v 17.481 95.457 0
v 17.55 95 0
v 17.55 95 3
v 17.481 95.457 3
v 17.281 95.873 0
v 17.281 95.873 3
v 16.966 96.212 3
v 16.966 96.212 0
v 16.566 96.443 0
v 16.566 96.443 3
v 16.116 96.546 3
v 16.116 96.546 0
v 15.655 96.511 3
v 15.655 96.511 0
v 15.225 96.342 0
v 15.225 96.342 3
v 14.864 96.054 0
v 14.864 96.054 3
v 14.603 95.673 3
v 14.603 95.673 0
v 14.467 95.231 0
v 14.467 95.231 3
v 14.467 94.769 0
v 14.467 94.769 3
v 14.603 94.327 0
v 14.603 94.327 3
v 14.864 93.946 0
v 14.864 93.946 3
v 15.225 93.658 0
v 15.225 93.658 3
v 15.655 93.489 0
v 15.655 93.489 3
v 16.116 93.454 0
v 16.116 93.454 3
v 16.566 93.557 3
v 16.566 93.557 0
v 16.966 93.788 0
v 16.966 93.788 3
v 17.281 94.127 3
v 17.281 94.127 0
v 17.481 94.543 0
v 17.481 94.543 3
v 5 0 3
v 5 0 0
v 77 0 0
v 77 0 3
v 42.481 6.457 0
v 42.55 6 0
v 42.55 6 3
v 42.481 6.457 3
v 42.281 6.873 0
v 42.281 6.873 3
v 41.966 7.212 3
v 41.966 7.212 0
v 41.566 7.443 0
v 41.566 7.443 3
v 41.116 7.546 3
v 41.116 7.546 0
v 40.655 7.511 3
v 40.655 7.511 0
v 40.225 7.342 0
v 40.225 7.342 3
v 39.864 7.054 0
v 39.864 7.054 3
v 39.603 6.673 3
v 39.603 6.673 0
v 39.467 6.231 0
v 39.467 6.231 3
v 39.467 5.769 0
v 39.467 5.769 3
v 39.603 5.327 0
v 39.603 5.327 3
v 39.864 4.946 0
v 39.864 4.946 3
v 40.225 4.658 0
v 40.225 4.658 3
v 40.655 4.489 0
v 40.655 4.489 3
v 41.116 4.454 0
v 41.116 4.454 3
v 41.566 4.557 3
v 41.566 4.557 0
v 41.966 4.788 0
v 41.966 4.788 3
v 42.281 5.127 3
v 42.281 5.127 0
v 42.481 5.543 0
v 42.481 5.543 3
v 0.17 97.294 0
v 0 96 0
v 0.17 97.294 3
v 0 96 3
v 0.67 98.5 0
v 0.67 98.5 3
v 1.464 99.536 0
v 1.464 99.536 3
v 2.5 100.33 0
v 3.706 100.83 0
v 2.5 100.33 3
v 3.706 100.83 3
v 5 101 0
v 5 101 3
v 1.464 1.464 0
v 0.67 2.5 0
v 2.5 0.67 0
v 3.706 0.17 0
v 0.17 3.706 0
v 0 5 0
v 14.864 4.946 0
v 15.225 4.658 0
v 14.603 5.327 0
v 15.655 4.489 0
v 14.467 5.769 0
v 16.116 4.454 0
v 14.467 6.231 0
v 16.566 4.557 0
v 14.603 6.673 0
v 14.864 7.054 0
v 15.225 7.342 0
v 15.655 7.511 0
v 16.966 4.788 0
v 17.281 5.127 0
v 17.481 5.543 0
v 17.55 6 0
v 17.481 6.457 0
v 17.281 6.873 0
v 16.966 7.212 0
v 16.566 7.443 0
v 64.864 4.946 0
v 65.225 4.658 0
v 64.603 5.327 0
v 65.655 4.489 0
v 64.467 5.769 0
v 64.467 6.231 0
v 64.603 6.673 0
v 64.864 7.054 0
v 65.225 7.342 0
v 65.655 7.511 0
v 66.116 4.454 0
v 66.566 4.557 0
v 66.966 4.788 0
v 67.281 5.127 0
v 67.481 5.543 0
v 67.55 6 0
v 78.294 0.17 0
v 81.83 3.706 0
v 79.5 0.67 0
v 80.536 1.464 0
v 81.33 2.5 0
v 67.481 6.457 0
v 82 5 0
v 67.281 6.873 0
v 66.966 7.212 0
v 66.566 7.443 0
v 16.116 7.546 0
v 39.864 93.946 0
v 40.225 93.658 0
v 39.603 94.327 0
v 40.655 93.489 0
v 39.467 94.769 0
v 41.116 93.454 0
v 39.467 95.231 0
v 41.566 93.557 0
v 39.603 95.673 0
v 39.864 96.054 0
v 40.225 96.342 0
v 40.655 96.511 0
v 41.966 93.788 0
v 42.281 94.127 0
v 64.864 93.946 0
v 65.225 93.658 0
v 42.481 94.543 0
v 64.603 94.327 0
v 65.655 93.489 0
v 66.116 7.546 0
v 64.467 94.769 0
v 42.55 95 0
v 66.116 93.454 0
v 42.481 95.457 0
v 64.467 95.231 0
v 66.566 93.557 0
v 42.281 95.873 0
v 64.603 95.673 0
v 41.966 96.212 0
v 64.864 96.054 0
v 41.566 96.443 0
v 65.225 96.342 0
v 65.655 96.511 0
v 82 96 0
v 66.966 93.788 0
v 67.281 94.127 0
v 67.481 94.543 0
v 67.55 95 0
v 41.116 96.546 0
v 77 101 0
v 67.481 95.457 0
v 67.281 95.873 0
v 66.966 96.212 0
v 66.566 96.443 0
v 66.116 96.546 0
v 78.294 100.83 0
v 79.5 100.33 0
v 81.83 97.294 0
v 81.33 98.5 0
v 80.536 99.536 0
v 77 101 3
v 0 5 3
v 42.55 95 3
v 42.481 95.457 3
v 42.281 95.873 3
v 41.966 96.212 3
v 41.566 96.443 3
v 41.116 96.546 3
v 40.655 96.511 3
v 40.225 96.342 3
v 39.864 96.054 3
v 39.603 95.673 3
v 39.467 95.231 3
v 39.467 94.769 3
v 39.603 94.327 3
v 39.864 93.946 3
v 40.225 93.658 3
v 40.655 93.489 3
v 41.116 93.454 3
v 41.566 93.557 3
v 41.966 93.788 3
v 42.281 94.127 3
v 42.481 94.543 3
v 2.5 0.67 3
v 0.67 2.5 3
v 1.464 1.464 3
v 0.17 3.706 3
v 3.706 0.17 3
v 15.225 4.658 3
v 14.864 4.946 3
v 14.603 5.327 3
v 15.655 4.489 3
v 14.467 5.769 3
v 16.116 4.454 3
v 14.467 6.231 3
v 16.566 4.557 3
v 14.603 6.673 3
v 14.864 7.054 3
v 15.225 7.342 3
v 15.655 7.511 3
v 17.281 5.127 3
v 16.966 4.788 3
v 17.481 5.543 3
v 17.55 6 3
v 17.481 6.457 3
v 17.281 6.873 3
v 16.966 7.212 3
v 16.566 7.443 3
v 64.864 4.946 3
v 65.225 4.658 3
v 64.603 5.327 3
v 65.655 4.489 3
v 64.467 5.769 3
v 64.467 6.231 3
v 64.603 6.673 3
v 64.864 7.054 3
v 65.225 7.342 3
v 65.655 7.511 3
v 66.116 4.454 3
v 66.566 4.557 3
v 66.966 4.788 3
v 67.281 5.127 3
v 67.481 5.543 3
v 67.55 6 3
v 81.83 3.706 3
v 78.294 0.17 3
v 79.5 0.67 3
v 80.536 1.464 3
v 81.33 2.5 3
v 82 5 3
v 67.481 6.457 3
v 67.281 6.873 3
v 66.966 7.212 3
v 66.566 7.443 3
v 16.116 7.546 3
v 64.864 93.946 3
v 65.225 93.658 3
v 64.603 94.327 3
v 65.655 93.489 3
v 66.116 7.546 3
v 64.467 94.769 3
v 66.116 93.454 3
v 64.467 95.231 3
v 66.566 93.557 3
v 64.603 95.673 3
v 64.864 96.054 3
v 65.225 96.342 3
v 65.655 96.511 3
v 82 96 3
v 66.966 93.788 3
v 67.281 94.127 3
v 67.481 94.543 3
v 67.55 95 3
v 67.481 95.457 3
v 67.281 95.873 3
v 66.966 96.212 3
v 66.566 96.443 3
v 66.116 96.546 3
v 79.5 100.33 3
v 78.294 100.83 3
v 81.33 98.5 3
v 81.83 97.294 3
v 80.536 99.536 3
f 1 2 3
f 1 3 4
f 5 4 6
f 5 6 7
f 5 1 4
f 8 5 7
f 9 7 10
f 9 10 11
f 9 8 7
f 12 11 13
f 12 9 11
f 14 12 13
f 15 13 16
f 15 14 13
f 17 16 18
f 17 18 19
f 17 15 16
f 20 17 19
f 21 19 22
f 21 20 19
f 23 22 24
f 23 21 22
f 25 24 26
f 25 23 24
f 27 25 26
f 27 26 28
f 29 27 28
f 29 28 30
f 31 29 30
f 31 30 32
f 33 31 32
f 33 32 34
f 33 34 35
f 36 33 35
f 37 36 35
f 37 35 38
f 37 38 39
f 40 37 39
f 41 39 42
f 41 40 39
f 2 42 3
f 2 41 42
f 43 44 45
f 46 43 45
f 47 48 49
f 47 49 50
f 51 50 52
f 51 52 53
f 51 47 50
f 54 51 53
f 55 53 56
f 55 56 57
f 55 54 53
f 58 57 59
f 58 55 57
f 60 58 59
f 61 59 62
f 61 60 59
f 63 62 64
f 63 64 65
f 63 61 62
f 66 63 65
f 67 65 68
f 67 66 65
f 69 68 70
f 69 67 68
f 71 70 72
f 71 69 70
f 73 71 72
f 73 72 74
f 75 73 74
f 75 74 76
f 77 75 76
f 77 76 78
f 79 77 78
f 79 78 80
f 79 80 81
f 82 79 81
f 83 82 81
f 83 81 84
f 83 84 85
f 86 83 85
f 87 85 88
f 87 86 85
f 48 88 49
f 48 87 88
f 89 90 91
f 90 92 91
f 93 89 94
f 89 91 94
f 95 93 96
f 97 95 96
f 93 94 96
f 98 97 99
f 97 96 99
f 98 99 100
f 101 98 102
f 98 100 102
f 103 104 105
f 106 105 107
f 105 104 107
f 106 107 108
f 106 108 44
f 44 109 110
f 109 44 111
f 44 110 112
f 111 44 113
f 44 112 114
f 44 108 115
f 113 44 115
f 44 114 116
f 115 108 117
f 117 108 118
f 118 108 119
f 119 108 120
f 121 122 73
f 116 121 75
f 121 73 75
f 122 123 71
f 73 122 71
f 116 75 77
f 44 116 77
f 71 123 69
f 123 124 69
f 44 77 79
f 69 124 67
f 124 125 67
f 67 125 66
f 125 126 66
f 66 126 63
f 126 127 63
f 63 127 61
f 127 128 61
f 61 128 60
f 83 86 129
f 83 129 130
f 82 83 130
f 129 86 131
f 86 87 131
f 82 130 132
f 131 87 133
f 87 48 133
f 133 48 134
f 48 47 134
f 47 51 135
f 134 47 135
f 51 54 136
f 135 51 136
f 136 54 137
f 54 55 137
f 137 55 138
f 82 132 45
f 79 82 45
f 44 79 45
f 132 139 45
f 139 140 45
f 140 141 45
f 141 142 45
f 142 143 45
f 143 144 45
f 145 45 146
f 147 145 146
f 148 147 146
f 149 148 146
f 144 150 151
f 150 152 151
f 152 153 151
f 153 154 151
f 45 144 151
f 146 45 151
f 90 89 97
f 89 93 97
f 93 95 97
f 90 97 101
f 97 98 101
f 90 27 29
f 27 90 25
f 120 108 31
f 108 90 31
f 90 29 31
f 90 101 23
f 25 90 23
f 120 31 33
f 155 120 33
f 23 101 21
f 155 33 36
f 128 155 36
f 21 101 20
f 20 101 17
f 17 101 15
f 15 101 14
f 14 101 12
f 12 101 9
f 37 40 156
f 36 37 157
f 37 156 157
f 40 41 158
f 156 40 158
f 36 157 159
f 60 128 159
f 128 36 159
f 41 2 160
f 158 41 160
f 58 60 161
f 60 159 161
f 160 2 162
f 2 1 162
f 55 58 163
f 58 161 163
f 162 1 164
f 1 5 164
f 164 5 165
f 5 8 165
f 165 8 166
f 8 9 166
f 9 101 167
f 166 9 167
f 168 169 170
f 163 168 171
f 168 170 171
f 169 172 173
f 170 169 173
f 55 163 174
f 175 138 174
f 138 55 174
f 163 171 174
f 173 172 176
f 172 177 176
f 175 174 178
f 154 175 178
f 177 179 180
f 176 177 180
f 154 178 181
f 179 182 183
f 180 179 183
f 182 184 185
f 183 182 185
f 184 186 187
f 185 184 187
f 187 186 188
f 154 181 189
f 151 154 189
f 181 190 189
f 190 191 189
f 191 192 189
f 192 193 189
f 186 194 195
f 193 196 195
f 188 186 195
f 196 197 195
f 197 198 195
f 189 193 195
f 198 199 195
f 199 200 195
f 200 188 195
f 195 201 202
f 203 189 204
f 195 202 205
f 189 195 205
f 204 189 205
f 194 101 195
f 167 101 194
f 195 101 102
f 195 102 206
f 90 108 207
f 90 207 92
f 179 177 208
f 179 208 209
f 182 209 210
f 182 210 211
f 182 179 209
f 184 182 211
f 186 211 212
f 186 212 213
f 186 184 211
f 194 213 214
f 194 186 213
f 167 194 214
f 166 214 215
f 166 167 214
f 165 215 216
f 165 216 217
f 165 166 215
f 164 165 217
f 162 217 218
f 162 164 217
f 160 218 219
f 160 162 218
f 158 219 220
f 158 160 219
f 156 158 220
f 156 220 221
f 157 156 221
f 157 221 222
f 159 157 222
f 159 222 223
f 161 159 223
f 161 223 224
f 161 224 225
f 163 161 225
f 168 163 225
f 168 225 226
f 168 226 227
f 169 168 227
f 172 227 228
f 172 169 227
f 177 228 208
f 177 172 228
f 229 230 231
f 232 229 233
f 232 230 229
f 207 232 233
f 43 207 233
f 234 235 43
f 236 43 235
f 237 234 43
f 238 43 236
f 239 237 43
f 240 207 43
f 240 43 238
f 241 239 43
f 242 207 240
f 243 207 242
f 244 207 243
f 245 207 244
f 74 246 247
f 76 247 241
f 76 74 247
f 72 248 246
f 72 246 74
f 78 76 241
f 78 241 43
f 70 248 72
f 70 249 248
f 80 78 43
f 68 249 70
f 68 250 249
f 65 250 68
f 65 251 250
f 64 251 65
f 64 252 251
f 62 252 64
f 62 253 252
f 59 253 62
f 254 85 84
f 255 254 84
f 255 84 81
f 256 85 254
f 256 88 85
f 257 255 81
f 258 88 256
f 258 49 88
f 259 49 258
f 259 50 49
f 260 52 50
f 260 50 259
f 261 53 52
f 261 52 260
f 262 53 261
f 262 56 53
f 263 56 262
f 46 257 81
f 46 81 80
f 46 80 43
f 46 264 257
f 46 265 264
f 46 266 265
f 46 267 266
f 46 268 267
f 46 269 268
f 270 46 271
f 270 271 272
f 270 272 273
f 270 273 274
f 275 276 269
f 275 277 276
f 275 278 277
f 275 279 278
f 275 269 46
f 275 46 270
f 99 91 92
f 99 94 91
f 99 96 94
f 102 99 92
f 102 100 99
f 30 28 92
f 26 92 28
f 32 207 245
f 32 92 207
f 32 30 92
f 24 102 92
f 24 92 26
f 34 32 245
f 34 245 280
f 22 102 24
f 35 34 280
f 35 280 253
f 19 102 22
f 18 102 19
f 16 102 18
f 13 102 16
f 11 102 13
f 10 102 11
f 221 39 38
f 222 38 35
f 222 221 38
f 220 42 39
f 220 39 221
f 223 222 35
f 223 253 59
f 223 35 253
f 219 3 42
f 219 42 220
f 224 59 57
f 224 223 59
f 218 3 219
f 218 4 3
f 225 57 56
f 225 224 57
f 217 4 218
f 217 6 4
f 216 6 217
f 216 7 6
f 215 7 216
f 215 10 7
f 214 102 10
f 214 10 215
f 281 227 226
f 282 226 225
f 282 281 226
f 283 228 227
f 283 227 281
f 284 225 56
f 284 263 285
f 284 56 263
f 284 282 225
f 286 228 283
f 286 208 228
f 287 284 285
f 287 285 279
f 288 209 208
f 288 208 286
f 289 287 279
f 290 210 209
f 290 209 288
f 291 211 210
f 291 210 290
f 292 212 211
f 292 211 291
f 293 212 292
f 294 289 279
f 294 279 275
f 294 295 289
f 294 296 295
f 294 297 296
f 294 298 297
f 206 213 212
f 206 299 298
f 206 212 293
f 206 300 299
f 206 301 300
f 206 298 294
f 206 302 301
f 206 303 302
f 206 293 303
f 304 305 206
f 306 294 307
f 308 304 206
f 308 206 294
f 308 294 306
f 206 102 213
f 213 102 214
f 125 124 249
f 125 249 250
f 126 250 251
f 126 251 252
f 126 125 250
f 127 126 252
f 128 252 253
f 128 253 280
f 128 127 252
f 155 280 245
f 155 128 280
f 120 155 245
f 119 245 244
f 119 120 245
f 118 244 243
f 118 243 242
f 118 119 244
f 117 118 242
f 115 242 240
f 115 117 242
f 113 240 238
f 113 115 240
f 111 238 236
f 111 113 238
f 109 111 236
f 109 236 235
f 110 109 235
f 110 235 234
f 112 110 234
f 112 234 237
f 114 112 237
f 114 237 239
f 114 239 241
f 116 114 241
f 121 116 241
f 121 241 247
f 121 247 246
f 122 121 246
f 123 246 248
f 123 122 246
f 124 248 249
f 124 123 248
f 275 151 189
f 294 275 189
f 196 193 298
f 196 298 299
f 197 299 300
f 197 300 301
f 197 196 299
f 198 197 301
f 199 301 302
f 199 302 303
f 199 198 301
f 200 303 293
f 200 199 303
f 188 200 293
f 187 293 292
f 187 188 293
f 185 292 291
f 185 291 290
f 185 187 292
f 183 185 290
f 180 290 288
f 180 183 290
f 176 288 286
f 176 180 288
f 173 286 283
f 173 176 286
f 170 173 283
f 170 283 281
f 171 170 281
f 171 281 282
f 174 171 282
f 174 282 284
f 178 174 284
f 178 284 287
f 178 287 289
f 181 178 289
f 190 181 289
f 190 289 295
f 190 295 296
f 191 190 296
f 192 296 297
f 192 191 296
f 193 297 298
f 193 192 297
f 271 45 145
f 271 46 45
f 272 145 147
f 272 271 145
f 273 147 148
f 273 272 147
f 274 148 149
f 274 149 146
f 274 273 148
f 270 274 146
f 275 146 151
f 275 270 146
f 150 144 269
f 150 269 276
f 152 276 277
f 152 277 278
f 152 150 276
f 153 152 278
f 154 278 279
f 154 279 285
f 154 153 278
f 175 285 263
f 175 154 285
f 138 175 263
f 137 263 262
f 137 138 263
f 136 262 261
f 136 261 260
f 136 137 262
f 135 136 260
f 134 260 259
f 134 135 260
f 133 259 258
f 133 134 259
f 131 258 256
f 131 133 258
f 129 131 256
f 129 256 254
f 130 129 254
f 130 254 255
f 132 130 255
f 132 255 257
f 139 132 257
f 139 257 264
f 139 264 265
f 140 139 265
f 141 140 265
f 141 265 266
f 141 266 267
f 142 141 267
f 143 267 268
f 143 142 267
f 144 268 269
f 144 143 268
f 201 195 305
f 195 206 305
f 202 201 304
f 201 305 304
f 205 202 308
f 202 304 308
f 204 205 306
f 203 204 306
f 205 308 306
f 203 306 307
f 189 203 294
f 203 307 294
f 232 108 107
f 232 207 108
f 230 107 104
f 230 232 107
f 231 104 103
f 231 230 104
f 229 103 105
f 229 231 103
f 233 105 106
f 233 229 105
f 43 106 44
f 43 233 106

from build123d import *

# Parameters (mm, degrees)
SKETCH_1_W      = 82
SKETCH_1_H      = 101
SKETCH_1_R      = 1.55
EXTRUDE_1_DEPTH = 3
FILLET_1_R      = 5


with BuildPart() as part:
    # 草图1 → 凸台-拉伸1 (new body)
    with BuildSketch(Plane.XY):
        with Locations((41, 50.5)):
            Rectangle(SKETCH_1_W, SKETCH_1_H)
        with Locations((41, 6)):
            Circle(SKETCH_1_R, mode=Mode.SUBTRACT)
        with Locations((66, 6)):
            Circle(SKETCH_1_R, mode=Mode.SUBTRACT)
        with Locations((16, 6)):
            Circle(SKETCH_1_R, mode=Mode.SUBTRACT)
        with Locations((41, 95)):
            Circle(SKETCH_1_R, mode=Mode.SUBTRACT)
        with Locations((66, 95)):
            Circle(SKETCH_1_R, mode=Mode.SUBTRACT)
        with Locations((16, 95)):
            Circle(SKETCH_1_R, mode=Mode.SUBTRACT)
    extrude(amount=EXTRUDE_1_DEPTH)

    # 圆角1
    fillet_1_edges = [part.edges().sort_by_distance(p)[0] for p in [
        (0, 101, 1.5),
        (82, 101, 1.5),
        (82, 0, 1.5),
        (0, 0, 1.5),
    ]]
    fillet(fillet_1_edges, radius=FILLET_1_R)


solid = part.part
